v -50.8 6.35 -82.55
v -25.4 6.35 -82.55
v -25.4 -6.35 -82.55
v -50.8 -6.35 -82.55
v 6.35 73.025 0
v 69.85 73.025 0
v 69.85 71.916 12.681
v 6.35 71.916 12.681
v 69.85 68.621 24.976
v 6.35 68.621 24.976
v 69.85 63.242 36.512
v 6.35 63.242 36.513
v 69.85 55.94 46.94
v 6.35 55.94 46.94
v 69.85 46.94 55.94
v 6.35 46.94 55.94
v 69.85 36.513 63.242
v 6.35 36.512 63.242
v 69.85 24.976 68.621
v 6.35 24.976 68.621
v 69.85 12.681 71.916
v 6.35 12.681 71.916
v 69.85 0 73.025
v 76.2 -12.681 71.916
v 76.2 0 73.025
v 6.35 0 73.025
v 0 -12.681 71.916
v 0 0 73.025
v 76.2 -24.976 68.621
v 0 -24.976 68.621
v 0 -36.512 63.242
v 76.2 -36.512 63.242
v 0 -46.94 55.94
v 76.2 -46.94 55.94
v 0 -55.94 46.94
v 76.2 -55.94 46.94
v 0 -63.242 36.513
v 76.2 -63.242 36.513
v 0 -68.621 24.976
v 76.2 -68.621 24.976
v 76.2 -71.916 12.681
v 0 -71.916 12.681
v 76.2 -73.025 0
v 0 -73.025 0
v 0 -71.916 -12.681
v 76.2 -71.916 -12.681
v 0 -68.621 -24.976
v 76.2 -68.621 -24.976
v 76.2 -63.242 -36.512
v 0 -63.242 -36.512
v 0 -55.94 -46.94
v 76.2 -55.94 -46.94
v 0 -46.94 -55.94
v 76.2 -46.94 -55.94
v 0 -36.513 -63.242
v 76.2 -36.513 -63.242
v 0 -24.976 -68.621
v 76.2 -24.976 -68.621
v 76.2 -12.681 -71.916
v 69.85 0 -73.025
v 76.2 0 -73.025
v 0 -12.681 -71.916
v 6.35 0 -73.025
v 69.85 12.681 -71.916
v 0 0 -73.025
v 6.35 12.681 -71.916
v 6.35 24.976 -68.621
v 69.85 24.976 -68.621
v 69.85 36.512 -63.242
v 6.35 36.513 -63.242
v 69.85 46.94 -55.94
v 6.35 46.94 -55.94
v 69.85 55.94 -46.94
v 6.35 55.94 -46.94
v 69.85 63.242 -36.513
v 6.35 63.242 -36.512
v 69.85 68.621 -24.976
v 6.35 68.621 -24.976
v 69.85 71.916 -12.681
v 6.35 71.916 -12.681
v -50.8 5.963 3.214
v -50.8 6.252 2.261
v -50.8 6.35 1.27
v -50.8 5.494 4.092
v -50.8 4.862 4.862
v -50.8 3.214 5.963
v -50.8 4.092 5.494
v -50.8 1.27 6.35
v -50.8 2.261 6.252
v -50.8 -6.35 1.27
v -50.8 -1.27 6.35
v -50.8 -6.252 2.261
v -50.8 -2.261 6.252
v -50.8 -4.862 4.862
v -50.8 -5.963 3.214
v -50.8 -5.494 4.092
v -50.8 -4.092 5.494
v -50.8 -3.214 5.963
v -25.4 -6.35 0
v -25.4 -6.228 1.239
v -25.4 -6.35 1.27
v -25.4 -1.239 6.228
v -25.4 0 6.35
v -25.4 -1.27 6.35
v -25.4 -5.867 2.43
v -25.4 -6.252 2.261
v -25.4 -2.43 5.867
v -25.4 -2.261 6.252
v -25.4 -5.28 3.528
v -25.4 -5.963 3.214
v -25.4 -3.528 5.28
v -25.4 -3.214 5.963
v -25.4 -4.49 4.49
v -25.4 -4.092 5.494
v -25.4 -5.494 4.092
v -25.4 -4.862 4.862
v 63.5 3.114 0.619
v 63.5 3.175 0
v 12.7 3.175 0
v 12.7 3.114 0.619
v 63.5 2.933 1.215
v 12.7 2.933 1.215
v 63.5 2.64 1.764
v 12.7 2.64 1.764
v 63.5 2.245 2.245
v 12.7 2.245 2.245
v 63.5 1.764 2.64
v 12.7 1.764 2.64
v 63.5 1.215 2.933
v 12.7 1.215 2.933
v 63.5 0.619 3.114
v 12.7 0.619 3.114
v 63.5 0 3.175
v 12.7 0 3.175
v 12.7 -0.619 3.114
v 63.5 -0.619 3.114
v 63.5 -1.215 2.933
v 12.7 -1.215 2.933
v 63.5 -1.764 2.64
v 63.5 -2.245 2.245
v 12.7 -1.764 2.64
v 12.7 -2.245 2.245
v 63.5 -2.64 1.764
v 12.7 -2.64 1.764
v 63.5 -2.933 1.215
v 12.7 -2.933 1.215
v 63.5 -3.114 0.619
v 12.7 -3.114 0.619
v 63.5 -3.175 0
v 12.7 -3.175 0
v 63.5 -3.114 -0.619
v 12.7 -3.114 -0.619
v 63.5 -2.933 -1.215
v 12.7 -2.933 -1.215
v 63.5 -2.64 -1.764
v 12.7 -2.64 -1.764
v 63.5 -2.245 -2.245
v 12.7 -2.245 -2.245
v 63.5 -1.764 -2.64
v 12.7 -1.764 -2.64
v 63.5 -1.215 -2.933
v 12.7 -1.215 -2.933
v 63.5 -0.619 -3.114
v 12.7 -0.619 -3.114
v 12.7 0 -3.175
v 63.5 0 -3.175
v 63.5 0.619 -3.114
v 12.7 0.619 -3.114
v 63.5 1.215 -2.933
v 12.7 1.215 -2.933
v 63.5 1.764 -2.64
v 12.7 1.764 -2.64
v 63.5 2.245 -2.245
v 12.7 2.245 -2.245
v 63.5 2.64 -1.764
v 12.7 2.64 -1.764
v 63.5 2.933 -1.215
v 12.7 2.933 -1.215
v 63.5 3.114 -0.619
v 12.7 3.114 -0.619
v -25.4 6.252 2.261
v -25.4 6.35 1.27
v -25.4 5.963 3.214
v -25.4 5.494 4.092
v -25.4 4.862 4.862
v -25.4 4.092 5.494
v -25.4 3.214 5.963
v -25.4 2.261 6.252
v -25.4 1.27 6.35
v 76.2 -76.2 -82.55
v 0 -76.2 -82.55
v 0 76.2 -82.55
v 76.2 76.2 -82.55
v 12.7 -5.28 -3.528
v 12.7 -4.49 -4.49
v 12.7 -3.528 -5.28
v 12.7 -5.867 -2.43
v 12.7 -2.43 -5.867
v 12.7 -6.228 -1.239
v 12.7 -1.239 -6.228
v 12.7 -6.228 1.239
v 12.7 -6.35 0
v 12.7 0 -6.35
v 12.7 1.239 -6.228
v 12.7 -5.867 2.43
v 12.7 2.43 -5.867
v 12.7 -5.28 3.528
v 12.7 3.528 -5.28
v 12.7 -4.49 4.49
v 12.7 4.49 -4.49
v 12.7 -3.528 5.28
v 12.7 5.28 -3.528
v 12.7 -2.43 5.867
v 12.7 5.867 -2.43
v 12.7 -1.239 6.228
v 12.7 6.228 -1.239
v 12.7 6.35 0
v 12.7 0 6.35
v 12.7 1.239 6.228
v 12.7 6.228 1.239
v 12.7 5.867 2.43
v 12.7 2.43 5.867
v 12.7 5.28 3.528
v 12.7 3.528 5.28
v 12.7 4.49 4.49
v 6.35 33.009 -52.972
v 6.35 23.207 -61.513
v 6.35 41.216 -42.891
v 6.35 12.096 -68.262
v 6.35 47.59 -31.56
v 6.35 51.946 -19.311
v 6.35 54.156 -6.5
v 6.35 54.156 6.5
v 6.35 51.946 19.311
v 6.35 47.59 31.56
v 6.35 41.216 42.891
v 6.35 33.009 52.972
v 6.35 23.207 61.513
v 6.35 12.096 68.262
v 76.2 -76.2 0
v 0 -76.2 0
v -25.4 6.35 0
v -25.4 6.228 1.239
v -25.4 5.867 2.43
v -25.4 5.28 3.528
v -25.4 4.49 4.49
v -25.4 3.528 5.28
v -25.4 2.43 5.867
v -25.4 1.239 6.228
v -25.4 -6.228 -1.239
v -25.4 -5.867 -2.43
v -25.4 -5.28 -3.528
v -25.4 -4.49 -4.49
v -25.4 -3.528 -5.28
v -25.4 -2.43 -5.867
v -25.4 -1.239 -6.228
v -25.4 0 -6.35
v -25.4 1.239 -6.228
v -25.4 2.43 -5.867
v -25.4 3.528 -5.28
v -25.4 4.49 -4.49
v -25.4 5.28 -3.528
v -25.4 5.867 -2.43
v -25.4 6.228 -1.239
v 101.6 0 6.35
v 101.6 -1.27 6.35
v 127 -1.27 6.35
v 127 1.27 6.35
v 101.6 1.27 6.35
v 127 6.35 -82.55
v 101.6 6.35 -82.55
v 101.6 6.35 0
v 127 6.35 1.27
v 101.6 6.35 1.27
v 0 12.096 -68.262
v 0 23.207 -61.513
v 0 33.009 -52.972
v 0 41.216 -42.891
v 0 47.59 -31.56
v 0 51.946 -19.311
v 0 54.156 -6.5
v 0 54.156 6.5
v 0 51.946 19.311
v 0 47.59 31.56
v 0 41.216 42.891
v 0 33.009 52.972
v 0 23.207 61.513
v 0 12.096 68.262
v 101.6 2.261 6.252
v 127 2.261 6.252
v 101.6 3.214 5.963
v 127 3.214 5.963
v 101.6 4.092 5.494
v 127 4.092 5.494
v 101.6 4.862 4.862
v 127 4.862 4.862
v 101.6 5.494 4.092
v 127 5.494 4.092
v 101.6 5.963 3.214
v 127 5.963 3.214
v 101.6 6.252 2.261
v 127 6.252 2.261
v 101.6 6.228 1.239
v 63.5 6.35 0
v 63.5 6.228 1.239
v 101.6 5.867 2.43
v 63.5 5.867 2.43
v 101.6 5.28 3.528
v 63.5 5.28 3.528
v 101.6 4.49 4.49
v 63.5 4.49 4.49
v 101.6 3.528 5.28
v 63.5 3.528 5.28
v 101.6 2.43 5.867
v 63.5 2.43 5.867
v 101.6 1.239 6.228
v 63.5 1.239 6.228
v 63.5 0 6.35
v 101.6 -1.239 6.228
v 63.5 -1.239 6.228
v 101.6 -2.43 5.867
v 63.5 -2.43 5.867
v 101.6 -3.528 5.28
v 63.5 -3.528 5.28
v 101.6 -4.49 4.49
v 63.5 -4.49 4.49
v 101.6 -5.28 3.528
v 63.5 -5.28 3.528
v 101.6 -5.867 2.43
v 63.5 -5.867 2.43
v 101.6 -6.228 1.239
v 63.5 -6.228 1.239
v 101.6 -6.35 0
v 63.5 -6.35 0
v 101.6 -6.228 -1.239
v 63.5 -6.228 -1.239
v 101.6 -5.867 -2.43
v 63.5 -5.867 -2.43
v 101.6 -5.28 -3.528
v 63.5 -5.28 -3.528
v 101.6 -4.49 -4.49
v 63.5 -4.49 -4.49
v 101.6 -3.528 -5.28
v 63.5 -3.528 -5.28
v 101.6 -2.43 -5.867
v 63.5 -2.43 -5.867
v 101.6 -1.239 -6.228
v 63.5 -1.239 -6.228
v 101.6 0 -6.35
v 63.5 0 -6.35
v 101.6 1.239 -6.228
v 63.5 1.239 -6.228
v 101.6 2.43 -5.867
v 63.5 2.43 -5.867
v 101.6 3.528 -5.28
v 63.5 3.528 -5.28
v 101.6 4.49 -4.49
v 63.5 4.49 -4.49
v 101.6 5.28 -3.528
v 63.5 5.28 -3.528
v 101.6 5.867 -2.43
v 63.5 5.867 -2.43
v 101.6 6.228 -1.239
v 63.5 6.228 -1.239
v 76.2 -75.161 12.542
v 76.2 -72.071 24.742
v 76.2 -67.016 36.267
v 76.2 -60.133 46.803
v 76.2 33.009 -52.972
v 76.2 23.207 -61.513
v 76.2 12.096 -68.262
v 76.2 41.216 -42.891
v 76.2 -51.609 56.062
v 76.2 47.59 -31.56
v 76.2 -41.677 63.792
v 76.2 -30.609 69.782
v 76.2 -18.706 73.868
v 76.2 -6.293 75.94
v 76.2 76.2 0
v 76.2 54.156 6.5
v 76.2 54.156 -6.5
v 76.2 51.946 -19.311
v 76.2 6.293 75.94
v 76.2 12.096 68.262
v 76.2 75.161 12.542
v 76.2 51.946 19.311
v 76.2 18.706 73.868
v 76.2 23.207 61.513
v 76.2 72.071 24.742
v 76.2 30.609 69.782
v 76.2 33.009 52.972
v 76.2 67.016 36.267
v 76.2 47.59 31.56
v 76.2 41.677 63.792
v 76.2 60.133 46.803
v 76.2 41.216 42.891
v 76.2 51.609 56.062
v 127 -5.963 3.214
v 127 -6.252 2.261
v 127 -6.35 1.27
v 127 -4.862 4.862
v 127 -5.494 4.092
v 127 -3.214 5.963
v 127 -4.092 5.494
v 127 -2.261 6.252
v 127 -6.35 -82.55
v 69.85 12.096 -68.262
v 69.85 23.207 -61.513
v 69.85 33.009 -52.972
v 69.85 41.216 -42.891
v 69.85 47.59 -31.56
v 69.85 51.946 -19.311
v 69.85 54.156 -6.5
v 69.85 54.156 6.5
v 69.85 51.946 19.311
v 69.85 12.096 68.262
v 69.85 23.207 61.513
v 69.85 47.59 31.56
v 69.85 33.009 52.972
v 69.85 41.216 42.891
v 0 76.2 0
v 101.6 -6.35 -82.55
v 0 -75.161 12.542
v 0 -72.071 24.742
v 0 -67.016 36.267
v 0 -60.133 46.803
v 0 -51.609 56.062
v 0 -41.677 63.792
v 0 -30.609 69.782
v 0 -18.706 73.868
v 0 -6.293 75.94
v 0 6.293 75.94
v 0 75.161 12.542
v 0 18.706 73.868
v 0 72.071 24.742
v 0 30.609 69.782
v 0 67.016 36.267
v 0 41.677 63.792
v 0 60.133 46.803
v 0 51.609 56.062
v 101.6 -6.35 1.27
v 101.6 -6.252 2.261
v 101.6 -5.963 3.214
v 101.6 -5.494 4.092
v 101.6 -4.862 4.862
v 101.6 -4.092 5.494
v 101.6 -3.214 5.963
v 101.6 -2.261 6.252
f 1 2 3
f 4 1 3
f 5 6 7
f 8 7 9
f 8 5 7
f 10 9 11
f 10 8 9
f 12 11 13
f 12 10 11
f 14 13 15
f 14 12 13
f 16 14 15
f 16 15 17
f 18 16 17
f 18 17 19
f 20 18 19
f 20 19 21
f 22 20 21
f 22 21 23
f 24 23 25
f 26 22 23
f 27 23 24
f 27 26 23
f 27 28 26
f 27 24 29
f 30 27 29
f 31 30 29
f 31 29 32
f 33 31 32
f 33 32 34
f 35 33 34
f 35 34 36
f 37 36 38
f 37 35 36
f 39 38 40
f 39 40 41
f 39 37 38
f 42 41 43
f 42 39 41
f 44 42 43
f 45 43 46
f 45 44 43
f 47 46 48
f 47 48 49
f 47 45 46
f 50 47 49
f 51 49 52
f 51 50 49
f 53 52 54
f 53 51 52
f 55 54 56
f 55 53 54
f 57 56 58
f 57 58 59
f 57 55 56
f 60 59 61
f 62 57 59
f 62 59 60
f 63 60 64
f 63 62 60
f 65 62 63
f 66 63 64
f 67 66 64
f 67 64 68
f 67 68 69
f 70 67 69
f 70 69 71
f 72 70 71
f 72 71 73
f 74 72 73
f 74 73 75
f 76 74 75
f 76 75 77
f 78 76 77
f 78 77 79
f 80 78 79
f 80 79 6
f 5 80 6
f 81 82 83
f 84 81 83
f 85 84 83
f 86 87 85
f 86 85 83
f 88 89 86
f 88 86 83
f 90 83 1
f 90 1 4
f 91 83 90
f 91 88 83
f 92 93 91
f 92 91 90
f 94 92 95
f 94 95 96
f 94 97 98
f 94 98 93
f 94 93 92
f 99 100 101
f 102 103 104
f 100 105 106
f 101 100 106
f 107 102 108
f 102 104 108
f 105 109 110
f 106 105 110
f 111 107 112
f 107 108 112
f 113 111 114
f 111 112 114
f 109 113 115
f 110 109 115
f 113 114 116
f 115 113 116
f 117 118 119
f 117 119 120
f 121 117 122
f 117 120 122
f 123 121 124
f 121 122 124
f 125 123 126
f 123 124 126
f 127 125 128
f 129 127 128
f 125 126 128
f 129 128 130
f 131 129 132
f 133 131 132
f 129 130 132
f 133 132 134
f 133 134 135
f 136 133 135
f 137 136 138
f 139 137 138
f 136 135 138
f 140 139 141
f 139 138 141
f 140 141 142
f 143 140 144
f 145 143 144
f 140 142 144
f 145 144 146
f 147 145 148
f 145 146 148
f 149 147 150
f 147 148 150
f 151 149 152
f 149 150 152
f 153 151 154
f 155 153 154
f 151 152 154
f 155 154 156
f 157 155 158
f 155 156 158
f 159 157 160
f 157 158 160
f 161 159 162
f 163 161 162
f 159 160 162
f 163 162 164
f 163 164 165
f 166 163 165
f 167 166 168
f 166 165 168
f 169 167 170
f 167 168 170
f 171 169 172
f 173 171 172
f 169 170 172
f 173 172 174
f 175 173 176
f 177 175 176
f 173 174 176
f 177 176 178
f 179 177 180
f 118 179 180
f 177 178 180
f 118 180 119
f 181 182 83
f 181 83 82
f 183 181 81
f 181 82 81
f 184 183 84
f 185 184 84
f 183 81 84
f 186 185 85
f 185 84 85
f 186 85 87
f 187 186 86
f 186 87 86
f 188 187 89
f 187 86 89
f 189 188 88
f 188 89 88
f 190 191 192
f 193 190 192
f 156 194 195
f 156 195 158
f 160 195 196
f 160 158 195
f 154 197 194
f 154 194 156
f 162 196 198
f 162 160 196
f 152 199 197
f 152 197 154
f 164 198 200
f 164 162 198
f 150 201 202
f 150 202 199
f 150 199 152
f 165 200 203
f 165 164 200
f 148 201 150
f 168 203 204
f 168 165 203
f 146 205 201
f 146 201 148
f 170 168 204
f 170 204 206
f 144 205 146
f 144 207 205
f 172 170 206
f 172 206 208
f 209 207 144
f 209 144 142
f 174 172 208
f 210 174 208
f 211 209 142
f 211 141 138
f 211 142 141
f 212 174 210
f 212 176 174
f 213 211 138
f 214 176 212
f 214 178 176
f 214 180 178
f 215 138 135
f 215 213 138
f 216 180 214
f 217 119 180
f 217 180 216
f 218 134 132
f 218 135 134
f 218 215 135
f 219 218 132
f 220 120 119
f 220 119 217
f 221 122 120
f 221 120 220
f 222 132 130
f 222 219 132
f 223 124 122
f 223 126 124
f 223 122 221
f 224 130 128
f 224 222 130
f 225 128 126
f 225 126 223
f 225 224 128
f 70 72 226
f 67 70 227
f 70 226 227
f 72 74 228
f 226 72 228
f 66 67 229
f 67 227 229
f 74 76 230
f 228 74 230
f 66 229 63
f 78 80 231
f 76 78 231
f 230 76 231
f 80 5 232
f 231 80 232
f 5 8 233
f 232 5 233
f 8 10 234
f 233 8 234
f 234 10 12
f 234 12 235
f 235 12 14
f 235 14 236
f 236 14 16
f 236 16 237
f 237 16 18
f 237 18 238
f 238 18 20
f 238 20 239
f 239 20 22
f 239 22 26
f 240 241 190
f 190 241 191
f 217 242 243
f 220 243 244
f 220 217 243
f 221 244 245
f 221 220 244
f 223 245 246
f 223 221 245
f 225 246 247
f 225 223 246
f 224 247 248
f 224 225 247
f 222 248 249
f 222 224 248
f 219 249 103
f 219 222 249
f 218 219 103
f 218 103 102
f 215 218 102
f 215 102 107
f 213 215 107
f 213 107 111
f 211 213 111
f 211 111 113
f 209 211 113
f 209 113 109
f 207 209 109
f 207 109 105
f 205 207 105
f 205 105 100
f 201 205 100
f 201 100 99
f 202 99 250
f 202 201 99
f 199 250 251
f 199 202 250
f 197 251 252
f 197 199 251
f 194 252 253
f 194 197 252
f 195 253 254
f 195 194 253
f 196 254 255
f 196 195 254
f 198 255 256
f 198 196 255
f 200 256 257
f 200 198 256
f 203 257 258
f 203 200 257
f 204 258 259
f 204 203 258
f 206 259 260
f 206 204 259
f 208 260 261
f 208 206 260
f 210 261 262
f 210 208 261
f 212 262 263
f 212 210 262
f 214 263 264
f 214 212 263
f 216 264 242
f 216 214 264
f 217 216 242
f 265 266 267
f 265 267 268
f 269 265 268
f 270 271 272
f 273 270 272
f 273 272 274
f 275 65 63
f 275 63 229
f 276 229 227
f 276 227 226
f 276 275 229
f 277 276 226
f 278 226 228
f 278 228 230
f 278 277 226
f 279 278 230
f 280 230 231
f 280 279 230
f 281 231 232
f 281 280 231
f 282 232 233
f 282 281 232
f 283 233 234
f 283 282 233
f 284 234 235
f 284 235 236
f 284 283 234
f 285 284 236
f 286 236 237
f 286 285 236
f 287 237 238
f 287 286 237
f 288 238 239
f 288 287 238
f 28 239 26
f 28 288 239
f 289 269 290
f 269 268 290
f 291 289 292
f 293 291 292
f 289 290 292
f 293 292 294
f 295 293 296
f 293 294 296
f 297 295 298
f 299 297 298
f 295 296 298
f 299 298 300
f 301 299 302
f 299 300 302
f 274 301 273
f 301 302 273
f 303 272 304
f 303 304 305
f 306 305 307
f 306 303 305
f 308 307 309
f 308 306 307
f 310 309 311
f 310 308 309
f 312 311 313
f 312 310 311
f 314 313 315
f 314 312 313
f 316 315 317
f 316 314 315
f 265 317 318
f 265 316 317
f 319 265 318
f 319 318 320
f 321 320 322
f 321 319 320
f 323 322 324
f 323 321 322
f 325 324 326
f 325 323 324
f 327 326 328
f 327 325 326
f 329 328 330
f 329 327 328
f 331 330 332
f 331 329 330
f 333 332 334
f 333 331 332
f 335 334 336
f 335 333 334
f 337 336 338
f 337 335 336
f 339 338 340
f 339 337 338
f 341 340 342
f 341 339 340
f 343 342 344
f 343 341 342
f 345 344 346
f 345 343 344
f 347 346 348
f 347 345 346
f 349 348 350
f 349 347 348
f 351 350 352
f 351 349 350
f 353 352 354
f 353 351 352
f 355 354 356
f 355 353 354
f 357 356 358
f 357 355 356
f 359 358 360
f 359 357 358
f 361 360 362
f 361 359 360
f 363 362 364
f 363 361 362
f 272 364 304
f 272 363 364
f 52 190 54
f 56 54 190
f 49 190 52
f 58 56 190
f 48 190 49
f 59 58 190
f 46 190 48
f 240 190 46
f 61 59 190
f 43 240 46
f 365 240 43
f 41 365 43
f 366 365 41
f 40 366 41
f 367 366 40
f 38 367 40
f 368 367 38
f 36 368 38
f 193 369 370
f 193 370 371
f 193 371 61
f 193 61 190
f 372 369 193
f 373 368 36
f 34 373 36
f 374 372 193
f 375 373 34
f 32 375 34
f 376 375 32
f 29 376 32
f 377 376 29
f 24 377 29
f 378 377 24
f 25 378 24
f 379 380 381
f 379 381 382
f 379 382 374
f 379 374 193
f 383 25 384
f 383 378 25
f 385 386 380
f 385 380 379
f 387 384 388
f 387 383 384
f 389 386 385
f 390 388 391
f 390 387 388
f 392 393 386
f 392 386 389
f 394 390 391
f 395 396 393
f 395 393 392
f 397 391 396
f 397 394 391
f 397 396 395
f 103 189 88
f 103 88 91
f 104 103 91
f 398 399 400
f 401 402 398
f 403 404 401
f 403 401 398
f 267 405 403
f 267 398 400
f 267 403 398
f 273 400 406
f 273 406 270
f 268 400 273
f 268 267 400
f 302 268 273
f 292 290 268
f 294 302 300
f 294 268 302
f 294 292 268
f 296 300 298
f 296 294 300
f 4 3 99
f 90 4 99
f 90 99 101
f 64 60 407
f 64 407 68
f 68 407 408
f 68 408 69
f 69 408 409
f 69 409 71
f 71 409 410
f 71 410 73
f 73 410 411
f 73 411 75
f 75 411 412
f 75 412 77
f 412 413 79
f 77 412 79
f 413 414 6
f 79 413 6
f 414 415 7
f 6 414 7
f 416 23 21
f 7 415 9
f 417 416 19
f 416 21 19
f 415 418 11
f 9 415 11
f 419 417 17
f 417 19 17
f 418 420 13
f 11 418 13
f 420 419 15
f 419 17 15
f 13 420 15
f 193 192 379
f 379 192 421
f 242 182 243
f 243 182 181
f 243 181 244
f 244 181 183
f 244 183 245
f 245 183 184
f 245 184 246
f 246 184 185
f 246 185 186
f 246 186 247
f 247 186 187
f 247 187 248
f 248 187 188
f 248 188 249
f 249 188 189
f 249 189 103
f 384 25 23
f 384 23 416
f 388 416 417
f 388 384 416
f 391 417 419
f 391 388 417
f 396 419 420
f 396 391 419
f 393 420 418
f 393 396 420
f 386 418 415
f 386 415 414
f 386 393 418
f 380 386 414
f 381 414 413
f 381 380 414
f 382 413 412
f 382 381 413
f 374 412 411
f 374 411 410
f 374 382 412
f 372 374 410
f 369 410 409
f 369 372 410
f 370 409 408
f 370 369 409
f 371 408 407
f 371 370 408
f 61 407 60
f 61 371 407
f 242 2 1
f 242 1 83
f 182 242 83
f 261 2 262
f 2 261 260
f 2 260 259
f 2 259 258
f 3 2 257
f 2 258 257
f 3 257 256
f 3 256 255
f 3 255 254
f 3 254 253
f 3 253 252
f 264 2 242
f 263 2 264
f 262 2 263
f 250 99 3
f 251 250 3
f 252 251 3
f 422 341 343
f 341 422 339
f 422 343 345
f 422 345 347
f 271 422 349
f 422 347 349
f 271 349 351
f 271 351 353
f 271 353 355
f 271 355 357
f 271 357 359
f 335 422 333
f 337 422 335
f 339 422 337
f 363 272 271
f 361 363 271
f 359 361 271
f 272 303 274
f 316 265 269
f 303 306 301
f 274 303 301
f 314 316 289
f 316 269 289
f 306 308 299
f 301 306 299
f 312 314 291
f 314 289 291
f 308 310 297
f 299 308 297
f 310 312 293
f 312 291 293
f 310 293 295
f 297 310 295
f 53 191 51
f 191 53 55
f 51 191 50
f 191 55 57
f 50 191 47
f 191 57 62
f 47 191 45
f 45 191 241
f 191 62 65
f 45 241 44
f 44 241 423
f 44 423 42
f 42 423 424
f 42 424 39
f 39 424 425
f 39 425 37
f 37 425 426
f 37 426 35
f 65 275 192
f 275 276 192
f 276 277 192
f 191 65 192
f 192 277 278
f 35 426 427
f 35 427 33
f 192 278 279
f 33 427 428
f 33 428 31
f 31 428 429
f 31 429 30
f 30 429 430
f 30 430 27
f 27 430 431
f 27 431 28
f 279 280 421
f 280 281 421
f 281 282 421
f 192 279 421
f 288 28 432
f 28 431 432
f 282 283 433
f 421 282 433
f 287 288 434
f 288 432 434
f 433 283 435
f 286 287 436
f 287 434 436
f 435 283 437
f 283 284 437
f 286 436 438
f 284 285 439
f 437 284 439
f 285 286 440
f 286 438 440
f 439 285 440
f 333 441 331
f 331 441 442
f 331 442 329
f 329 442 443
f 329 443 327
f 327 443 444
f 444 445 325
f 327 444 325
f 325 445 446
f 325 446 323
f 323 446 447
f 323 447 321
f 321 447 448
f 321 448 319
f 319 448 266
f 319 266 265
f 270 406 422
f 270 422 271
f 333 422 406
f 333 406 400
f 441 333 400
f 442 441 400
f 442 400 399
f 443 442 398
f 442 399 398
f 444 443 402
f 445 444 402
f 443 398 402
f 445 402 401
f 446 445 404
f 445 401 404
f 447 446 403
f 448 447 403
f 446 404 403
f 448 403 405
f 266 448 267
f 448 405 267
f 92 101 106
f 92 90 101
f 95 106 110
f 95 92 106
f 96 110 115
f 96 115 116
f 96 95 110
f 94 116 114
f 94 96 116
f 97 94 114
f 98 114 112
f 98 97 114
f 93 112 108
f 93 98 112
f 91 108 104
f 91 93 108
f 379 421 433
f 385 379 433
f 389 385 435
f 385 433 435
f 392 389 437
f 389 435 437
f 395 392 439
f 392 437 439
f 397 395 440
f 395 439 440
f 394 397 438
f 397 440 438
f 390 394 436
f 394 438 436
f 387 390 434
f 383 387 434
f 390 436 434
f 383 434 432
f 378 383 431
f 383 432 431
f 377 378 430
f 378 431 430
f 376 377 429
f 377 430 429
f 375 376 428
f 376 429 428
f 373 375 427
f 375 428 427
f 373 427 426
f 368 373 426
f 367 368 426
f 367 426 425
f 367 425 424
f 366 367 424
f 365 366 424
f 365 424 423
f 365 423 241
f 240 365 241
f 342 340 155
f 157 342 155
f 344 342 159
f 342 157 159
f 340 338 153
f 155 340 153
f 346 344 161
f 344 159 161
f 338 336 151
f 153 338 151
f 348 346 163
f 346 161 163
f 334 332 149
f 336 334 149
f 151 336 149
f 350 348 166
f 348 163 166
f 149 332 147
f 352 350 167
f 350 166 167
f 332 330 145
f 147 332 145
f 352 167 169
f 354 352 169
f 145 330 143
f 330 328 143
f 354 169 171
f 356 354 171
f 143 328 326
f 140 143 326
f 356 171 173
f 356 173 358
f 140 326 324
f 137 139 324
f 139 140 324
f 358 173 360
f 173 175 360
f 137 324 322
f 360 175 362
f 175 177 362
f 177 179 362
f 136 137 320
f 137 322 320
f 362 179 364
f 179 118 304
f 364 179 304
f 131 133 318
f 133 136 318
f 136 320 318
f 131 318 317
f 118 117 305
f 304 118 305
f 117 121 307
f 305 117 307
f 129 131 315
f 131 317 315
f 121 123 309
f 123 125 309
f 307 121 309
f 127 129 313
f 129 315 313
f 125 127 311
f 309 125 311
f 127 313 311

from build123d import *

# Parameters (mm, degrees)
F0_R      = 73.025
F1_DEPTH  = 76.2
F4_DEPTH  = 6.35
F7_DEPTH  = 6.35
F9_R      = 6.35
F10_DEPTH = 63.5
F11_R     = 7.3359072407
F11_R_2   = 3.175
F12_DEPTH = 25.4
F13_DEPTH = 76.2
F14_W     = 12.7
F14_H     = 88.9
F15_DEPTH = 25.4
F16_W     = 12.7
F16_H     = 88.9
F17_DEPTH = 25.4
F18_R     = 5.08


with BuildPart() as f1:
    # F0 (on Right) → F1 (new body)
    with BuildSketch(Plane.YZ):
        with BuildLine():
            ThreePointArc((-76.2, 0), (0, -76.2), (76.2, 0))
            ThreePointArc((76.2, 0), (0, 76.2), (-76.2, 0))
        make_face()
        Circle(F0_R, mode=Mode.SUBTRACT)
    extrude(amount=F1_DEPTH)

    # F3 (on offset) → F4 (join)
    with BuildSketch(Plane.YZ.offset(76.2)):
        with BuildLine():
            ThreePointArc((0, 73.025), (54.4332966437, 0), (0, -73.025))
            ThreePointArc((0, -73.025), (73.025, 0), (0, 73.025))
        make_face()
    extrude(amount=-F4_DEPTH)

    # F6 (on offset) → F7 (join)
    with BuildSketch(Plane(origin=(0, 0, 0), x_dir=(0, -1, 0), z_dir=(-1, 0, 0))):
        with BuildLine():
            ThreePointArc((0, -73.025), (-54.4332966437, 0), (0, 73.025))
            ThreePointArc((0, 73.025), (-73.025, 0), (0, -73.025))
        make_face()
    extrude(amount=-F7_DEPTH)

    # F0 (on Right) → F13 (join)
    with BuildSketch(Plane.YZ):
        with BuildLine():
            Line((76.2, -82.55), (76.2, 0))
            ThreePointArc((76.2, 0), (0, -76.2), (-76.2, 0))
            Line((-76.2, 0), (-76.2, -82.55))
            Line((-76.2, -82.55), (76.2, -82.55))
        make_face()
    extrude(amount=F13_DEPTH)


with BuildPart() as f10:
    # F9 (on offset) → F10 (new body, symmetric)
    with BuildSketch(Plane.YZ.offset(38.1)):
        Circle(F9_R)
    extrude(amount=F10_DEPTH, both=True)

    # F11 (on offset) → F12 (cut, symmetric)
    with BuildSketch(Plane.YZ.offset(38.1)):
        Circle(F11_R)
        Circle(F11_R_2, mode=Mode.SUBTRACT)
    extrude(amount=F12_DEPTH, both=True, mode=Mode.SUBTRACT)

    # F14 (on face) → F15 (join)
    with BuildSketch(Plane(origin=(-25.4, 0, 0), x_dir=(0, -1, 0), z_dir=(-1, 0, 0))):
        with Locations((0, -38.1)):
            Rectangle(F14_W, F14_H)
    extrude(amount=F15_DEPTH)

    # F16 (on face) → F17 (join)
    with BuildSketch(Plane.YZ.offset(101.6)):
        with Locations((0, -38.1)):
            Rectangle(F16_W, F16_H)
    extrude(amount=F17_DEPTH)

    # F18
    f18_edges = [f10.edges().sort_by_distance(p)[0] for p in [
        (-38.1, 6.35, 6.35),
        (-38.1, -6.35, 6.35),
        (114.3, -6.35, 6.35),
        (114.3, 6.35, 6.35),
    ]]
    fillet(f18_edges, radius=F18_R)


solid = Compound([f1.part, f10.part])
